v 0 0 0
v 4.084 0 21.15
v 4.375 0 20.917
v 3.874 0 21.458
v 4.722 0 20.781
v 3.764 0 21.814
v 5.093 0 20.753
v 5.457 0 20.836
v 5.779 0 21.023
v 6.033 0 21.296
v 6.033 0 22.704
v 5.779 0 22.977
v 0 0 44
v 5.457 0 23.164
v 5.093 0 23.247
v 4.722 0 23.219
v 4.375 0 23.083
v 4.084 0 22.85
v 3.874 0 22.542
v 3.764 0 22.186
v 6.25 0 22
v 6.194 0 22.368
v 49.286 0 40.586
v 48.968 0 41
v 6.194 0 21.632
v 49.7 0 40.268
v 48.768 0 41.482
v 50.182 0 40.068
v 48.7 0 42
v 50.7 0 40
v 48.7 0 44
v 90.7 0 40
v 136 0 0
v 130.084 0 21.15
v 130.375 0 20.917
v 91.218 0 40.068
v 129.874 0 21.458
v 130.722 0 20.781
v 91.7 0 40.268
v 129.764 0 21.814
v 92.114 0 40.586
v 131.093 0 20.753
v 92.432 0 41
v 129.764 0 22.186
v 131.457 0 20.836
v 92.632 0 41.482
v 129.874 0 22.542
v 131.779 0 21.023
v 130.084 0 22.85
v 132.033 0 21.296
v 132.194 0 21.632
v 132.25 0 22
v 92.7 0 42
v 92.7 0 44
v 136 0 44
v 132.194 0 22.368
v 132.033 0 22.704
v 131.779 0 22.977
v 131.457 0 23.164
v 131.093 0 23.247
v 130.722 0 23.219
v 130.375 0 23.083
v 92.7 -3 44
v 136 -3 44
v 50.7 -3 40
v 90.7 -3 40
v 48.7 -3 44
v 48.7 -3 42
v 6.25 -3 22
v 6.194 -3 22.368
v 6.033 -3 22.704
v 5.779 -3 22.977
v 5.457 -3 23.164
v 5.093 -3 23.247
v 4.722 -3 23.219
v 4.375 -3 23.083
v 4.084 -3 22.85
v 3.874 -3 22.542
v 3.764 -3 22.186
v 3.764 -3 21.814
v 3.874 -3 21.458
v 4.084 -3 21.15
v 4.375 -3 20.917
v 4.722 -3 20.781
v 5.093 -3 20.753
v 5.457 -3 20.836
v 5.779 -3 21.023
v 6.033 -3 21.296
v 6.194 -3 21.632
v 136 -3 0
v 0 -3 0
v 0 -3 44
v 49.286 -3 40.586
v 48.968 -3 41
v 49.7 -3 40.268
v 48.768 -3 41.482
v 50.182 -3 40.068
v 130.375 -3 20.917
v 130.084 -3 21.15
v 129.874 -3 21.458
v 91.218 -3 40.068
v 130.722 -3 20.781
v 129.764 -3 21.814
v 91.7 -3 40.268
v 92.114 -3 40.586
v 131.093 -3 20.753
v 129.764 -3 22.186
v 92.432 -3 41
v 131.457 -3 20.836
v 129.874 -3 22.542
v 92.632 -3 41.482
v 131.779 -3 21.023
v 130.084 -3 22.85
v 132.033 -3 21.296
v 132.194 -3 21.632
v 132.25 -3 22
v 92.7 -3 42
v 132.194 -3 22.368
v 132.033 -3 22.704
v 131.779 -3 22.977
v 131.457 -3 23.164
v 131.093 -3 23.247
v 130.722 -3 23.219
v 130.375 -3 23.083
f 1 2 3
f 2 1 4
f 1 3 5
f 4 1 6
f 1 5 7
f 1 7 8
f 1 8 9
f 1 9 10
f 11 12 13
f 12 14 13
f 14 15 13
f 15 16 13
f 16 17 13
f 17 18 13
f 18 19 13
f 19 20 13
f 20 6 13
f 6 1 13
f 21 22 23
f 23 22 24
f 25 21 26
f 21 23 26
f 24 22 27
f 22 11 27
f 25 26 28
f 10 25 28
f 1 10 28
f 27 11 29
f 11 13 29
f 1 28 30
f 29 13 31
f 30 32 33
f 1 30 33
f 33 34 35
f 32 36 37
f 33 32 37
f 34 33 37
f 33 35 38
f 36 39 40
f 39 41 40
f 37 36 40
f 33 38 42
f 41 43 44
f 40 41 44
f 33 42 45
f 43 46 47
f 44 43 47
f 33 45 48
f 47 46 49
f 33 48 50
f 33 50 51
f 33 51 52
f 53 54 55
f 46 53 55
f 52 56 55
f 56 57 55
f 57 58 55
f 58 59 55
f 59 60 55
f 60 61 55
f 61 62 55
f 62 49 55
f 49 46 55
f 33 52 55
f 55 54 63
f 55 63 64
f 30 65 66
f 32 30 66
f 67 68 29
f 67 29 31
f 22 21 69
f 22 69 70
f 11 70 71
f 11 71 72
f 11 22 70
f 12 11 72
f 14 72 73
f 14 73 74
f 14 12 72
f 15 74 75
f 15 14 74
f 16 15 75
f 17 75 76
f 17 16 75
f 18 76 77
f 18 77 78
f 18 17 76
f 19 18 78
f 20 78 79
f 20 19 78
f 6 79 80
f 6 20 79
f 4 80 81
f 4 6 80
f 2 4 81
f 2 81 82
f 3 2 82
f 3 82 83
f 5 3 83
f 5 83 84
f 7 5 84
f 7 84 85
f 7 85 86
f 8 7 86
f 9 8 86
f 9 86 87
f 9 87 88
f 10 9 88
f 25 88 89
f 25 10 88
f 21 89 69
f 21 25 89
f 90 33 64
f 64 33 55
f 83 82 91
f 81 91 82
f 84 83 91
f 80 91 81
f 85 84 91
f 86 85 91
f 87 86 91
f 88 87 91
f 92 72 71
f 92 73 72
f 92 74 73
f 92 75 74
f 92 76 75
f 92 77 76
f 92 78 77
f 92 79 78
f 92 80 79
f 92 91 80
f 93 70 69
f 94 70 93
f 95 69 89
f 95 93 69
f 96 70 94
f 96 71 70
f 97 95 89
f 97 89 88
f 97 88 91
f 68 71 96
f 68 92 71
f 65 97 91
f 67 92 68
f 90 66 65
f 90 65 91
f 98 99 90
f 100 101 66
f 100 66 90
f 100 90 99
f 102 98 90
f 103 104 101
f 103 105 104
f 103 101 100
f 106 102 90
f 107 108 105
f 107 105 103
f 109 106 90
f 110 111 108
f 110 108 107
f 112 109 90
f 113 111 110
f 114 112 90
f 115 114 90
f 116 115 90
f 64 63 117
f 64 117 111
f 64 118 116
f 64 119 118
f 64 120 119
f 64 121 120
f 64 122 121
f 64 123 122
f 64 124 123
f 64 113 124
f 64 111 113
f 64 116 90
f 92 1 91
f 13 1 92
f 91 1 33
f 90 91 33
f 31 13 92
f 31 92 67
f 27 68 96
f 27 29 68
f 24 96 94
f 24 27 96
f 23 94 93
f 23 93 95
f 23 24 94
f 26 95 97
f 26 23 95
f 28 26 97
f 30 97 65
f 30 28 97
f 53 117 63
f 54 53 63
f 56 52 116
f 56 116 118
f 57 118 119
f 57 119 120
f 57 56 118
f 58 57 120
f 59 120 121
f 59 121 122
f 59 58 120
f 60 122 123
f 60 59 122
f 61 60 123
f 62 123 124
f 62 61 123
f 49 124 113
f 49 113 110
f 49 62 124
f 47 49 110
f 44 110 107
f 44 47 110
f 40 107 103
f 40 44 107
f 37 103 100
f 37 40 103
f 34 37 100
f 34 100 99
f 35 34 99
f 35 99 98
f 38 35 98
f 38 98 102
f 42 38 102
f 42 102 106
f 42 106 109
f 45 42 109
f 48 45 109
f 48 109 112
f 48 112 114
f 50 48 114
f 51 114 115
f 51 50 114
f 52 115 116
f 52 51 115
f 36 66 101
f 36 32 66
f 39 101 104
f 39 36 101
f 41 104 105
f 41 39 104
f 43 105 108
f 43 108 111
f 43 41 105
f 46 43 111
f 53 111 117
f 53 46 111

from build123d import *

# Parameters (mm, degrees)
SKETCH_W     = 136
SKETCH_H     = 44
SKETCH_R     = 1.25
PAD_DEPTH    = 3
SKETCH001_W  = 44
SKETCH001_H  = 5
POCKET_DEPTH = 3.001
FILLET_R     = 2


with BuildPart() as part:
    # Sketch → Pad (new body)
    with BuildSketch(Plane.XZ):
        with Locations((68, 22)):
            Rectangle(SKETCH_W, SKETCH_H)
        with Locations((5, 22)):
            Circle(SKETCH_R, mode=Mode.SUBTRACT)
        with Locations((131, 22)):
            Circle(SKETCH_R, mode=Mode.SUBTRACT)
    extrude(amount=PAD_DEPTH)

    # Sketch001 (on Face8 of Pad) → Pocket (cut, through all)
    with BuildSketch(Plane.XZ.offset(3)):
        with Locations((70.7, 42.5)):
            Rectangle(SKETCH001_W, SKETCH001_H)
    extrude(amount=-POCKET_DEPTH, mode=Mode.SUBTRACT)

    # Fillet
    fillet_edges = [part.edges().sort_by_distance(p)[0] for p in [
        (48.7, -1.5, 40),
        (92.7, -1.5, 40),
    ]]
    fillet(fillet_edges, radius=FILLET_R)


solid = part.part
